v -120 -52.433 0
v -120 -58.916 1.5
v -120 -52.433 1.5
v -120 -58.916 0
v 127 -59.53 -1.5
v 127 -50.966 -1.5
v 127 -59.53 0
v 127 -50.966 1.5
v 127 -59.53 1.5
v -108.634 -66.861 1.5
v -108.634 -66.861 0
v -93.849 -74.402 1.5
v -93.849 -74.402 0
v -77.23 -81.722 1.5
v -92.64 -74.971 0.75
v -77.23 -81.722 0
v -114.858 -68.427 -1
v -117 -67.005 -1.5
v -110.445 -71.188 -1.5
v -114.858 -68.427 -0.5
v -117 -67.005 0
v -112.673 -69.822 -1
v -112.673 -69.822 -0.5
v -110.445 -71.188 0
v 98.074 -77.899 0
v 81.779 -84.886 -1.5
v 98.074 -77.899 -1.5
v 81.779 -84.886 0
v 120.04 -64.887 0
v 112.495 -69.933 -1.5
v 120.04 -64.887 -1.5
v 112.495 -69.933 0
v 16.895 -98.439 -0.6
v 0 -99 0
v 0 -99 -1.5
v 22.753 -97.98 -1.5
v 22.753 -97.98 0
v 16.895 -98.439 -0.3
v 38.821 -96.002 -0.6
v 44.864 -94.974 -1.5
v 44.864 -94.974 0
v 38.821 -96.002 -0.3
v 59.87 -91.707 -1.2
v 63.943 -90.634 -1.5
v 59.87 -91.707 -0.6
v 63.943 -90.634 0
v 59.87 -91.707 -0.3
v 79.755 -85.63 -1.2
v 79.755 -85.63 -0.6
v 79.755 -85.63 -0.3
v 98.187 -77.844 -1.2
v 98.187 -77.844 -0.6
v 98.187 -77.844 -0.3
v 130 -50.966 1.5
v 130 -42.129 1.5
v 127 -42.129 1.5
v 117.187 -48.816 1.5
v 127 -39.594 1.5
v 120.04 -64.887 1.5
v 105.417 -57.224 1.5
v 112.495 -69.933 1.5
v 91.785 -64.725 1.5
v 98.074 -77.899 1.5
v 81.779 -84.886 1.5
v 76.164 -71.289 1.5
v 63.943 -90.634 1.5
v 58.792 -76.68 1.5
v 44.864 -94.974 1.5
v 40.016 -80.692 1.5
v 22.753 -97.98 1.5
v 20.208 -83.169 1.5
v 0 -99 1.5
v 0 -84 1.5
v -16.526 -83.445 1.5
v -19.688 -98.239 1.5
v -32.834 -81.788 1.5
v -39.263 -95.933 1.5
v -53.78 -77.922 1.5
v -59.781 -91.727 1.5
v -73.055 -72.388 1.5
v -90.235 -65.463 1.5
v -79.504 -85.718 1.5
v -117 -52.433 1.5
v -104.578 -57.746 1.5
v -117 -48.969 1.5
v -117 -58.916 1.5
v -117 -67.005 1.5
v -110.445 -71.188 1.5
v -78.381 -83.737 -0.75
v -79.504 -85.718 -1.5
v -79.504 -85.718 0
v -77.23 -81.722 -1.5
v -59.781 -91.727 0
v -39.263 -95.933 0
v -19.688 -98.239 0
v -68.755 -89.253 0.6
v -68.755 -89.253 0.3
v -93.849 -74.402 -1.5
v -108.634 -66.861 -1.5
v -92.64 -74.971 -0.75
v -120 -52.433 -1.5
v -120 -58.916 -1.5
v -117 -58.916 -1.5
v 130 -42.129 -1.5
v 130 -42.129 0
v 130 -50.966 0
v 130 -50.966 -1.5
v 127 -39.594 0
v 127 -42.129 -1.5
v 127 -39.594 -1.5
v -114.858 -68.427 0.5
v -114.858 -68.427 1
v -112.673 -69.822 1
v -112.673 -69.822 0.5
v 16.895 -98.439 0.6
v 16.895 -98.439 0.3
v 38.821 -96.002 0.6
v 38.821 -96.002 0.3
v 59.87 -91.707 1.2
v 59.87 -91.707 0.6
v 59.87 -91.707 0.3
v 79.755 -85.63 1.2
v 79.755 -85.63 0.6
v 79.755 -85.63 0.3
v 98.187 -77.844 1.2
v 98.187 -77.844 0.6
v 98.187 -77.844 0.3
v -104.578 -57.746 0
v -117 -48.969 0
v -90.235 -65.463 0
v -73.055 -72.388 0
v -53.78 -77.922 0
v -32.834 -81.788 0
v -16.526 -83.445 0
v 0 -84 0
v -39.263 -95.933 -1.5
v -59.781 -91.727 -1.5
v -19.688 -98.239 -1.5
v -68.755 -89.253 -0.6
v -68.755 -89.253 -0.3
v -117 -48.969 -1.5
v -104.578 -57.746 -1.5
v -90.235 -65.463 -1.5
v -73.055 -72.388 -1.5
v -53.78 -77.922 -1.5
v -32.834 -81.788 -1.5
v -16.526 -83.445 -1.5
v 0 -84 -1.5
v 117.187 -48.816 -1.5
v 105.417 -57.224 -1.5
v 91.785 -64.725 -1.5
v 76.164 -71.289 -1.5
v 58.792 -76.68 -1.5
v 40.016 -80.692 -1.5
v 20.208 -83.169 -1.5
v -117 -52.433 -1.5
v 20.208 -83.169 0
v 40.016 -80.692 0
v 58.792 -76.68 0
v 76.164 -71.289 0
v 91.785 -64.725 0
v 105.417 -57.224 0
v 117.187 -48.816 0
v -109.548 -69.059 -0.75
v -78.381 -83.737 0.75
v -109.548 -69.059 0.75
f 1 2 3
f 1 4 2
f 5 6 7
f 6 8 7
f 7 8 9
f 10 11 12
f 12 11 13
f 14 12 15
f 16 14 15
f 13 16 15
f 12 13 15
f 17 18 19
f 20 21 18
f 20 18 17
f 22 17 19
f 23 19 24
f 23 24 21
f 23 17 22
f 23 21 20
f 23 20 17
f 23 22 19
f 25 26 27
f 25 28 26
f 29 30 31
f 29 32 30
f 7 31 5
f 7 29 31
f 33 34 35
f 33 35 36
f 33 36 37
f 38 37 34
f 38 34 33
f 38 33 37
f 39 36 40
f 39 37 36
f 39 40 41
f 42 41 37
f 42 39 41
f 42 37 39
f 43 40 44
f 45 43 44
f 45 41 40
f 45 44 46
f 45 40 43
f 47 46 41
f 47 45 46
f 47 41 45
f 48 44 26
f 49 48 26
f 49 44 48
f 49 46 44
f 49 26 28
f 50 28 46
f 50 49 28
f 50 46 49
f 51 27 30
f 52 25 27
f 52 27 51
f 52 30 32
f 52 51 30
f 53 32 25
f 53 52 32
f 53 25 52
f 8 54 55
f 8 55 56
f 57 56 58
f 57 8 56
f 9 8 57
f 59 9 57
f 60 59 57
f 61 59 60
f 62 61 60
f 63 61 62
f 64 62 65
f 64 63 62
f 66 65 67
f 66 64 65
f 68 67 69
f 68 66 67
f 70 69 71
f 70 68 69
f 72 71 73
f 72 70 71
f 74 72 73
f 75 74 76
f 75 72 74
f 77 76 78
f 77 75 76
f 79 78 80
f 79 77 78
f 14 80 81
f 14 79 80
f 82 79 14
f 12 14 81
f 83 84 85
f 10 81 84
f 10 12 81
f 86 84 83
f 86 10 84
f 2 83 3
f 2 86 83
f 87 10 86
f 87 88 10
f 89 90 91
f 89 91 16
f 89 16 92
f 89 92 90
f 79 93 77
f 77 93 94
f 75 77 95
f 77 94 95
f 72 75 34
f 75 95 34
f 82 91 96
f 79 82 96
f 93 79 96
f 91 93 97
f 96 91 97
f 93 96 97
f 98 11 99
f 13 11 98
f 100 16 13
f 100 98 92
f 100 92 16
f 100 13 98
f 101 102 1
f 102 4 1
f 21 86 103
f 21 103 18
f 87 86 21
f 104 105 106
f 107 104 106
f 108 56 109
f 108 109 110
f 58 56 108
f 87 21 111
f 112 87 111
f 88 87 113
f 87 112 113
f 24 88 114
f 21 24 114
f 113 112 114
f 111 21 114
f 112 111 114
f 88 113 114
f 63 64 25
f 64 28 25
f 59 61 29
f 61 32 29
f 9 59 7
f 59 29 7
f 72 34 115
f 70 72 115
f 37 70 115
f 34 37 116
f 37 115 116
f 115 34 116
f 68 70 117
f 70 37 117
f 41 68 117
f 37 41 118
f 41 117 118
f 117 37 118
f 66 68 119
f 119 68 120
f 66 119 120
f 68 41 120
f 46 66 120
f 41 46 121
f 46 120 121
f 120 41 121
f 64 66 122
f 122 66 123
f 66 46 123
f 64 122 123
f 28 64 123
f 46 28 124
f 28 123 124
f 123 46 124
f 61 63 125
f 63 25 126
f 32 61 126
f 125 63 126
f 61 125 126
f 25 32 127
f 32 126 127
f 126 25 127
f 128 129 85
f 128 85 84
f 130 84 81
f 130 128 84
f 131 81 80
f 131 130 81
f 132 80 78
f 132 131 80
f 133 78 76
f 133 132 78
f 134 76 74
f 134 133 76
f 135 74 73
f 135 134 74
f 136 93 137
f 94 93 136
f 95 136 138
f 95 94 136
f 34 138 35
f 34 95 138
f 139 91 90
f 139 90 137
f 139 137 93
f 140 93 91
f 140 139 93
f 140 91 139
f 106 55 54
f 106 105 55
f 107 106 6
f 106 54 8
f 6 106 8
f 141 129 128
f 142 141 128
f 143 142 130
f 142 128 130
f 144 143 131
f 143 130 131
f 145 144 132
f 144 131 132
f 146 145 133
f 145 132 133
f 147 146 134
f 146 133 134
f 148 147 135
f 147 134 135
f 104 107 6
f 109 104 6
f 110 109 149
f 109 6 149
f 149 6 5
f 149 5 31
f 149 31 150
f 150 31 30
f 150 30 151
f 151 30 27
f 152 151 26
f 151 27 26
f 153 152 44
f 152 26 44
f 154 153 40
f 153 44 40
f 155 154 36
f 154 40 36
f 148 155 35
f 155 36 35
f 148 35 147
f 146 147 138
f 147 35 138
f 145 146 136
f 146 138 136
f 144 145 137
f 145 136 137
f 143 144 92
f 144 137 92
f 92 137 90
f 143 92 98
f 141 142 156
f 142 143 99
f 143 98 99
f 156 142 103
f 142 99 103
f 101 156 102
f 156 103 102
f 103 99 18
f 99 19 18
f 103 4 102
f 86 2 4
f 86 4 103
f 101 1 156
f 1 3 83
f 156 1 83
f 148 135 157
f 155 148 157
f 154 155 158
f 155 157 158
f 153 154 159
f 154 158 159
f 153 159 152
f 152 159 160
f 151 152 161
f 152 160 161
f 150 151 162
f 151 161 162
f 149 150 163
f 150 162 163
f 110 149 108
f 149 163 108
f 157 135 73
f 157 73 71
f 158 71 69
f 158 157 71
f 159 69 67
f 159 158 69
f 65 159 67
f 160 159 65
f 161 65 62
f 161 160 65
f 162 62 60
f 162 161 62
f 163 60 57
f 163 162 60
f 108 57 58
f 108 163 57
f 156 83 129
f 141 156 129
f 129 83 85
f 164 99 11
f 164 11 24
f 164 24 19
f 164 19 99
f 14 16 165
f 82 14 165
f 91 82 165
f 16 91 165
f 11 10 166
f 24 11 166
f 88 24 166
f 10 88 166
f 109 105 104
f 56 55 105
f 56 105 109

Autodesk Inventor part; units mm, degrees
ref_plane "YZ Plane" through (0, 0, 0) normal (1, 0, 0) x (0, 1, 0)
ref_plane "XZ Plane" through (0, 0, 0) normal (0, 1, 0) x (-1, 0, 0)
ref_plane "XY Plane" through (0, 0, 0) normal (0, 0, 1) x (1, 0, 0)
ref_plane "Work Plane1" through (0, 0, 0) normal (0, 0, 1) x (-1, 0, 0)
sketch "Sketch1" plane through (0, 0, 0) normal (0, 0, 1) x (-1, 0, 0)
  spline S0 degree 3 poles (105.4883, 71.0587) (105.6559, 71.4694) (105.824, 71.88) (106.1569, 72.6904) (106.3216, 73.0904) (106.4867, 73.4901) knots -0.266162 -0.266162 -0.266162 -0.266162 -0.133087 -0.133087 -0.003341 -0.003341 -0.003341 -0.003341
  spline S1 degree 3 poles (106.4867, 73.4901) (99.3414, 77.5054) (91.623, 81.1106) (83.426, 84.2596) knots -25.895552 -25.895552 -25.895552 -25.895552 -23.89596 -23.89596 -23.89596 -23.89596
  spline S2 degree 3 poles (83.426, 84.2596) (83.383, 84.1862) (83.3401, 84.1127) (83.2498, 83.9584) (83.2025, 83.8776) (83.1552, 83.7967) knots -0.053633 -0.053633 -0.053633 -0.053633 -0.028107 -0.028107 0 0 0 0
  spline S3 degree 3 poles (83.1552, 83.7967) (82.995, 83.5034) (82.8346, 83.2101) (82.5137, 82.6238) (82.353, 82.3306) (82.1922, 82.0376) knots -0.200537 -0.200537 -0.200537 -0.200537 -0.100278 -0.100278 -0.000001 -0.000001 -0.000001 -0.000001
  spline S4 degree 3 poles (82.1922, 82.0376) (86.075, 80.3865) (89.9435, 78.6654) (97.7089, 75.0245) (101.6317, 73.0864) (105.4883, 71.0587) knots -2.573015 -2.573015 -2.573015 -2.573015 -1.307167 -1.307167 -0.00005 -0.00005 -0.00005 -0.00005
  spline S5 degree 3 poles (-58.9228, -91.9417) (-58.7749, -91.5277) (-58.6267, -91.1139) (-58.3286, -90.2835) (-58.1787, -89.8669) (-58.0284, -89.4505) knots -0.264733 -0.264733 -0.264733 -0.264733 -0.132868 -0.132868 -0.000055 -0.000055 -0.000055 -0.000055
  spline S6 degree 3 poles (-58.0284, -89.4505) (-62.2238, -88.2949) (-66.4105, -87.0769) (-74.8294, -84.4769) (-79.0836, -83.0842) (-83.2953, -81.6123) knots -2.643421 -2.643421 -2.643421 -2.643421 -1.338468 -1.338468 -0.000018 -0.000018 -0.000018 -0.000018
  spline S7 degree 3 poles (-83.2953, -81.6123) (-83.3681, -81.9392) (-83.4412, -82.2661) (-83.5877, -82.9196) (-83.6612, -83.2462) (-83.7349, -83.5728) knots -0.200918 -0.200918 -0.200918 -0.200918 -0.100445 -0.100445 0 0 0 0
  spline S8 degree 3 poles (-83.7349, -83.5728) (-83.7526, -83.6651) (-83.7703, -83.7574) (-83.8042, -83.9335) (-83.8204, -84.0175) (-83.8365, -84.1014) knots -0.056363 -0.056363 -0.056363 -0.056363 -0.02818 -0.02818 -0.002542 -0.002542 -0.002542 -0.002542
  spline S9 degree 3 poles (-83.8365, -84.1014) (-75.9007, -87.1708) (-67.5641, -89.7922) (-58.9228, -91.9417) knots -18.70759 -18.70759 -18.70759 -18.70759 -16.308401 -16.308401 -16.308401 -16.308401
  spline S10 degree 3 poles (-140.1561, 42.7052) (-140.5265, 42.9467) (-140.897, 43.1882) (-141.6163, 43.6575) (-141.9653, 43.8854) (-142.3142, 44.1132) knots -0.265285 -0.265285 -0.265285 -0.265285 -0.132646 -0.132646 -0.007633 -0.007633 -0.007633 -0.007633
  spline S11 degree 3 poles (-142.3142, 44.1132) (-146.1137, 39.3661) (-149.4383, 34.2577) (-152.1041, 28.8109) knots -4.827939 -4.827939 -4.827939 -4.827939 -3.006582 -3.006582 -3.006582 -3.006582
  spline S12 degree 3 poles (-152.1041, 28.8109) (-152.0643, 28.7818) (-152.0246, 28.7528) (-151.9093, 28.6685) (-151.8337, 28.6133) (-151.7582, 28.5581) knots -0.042842 -0.042842 -0.042842 -0.042842 -0.028073 -0.028073 -0.000004 -0.000004 -0.000004 -0.000004
  spline S13 degree 3 poles (-151.7582, 28.5581) (-151.4839, 28.3673) (-151.2096, 28.1764) (-150.6612, 27.7945) (-150.3869, 27.6033) (-150.1128, 27.4122) knots -0.200499 -0.200499 -0.200499 -0.200499 -0.100262 -0.100262 -0.000004 -0.000004 -0.000004 -0.000004
  spline S14 degree 3 poles (-150.1128, 27.4122) (-148.5536, 30.1288) (-146.8737, 32.8286) (-143.5422, 37.8978) (-141.8646, 40.3248) (-140.1561, 42.7052) knots -1.819993 -1.819993 -1.819993 -1.819993 -0.879034 -0.879034 -0.00001 -0.00001 -0.00001 -0.00001
  spline S15 degree 3 poles (-55.7728, -89.0282) (-55.9385, -89.4734) (-56.1038, -89.9189) (-56.4333, -90.8099) (-56.5976, -91.2556) (-56.7614, -91.7014) knots -0.285003 -0.285003 -0.285003 -0.285003 -0.142483 -0.142483 0 0 0 0
  spline S16 degree 3 poles (-56.7614, -91.7014) (-56.6983, -91.718) (-56.6352, -91.7345) (-56.509, -91.7676) (-56.4459, -91.7842) (-56.3828, -91.8007) knots -0.039143 -0.039143 -0.039143 -0.039143 -0.019569 -0.019569 0 0 0 0
  spline S17 degree 3 poles (-56.3828, -91.8007) (-56.222, -91.32) (-56.0607, -90.8394) (-55.7373, -89.8786) (-55.5752, -89.3983) (-55.4125, -88.9181) knots -0.30413 -0.30413 -0.30413 -0.30413 -0.152078 -0.152078 0 0 0 0
  spline S18 degree 3 poles (-55.4125, -88.9181) (-60.3959, -87.5747) (-65.3718, -86.1432) (-75.3762, -83.0506) (-80.443, -81.3711) (-85.4421, -79.5755) knots -3.141533 -3.141533 -3.141533 -3.141533 -1.593545 -1.593545 0 0 0 0
  spline S19 degree 3 poles (-85.4421, -79.5755) (-85.6008, -80.3472) (-85.7615, -81.1191) (-86.0831, -82.6482) (-86.2442, -83.4064) (-86.4067, -84.1638) knots -0.472496 -0.472496 -0.472496 -0.472496 -0.236135 -0.236135 -0.003733 -0.003733 -0.003733 -0.003733
  spline S20 degree 3 poles (-86.4067, -84.1638) (-90.9201, -82.3538) (-95.299, -80.3975) (-116.0195, -70.1094) (-129.7607, -59.9705) (-146.1593, -41.4596) (-151.3501, -33.6293) (-158.2079, -17.0493) (-159.9962, -8.6553) (-160, -0.0185) (-160, -0.0092) (-160, 0) knots -11.169519 -11.169519 -11.169519 -11.169519 -9.988301 -9.988301 -5.37837 -5.37837 -2.588261 -2.588261 0 0 0.002775 0.002775 0.002775 0.002775
  spline S21 degree 3 poles (-160, 0) (-160, 0.0092) (-160, 0.0185) (-159.9962, 8.6553) (-158.2079, 17.0493) (-154.5318, 25.937) (-154.1376, 26.8372) (-153.7259, 27.7288) knots -31.829362 -31.829362 -31.829362 -31.829362 -31.826146 -31.826146 -28.826161 -28.826161 -28.484445 -28.484445 -28.484445 -28.484445
  spline S22 degree 3 poles (-153.7259, 27.7288) (-153.1336, 27.3124) (-152.5409, 26.8949) (-151.3076, 26.0243) (-150.6649, 25.5695) (-150.024, 25.1147) knots -0.452924 -0.452924 -0.452924 -0.452924 -0.235762 -0.235762 0 0 0 0
  spline S23 degree 3 poles (-150.024, 25.1147) (-148.2187, 28.3868) (-146.2111, 31.6512) (-142.2626, 37.6605) (-140.2732, 40.5119) (-138.2471, 43.2948) knots -2.156978 -2.156978 -2.156978 -2.156978 -1.032693 -1.032693 0 0 0 0
  spline S24 degree 3 poles (-138.2471, 43.2948) (-138.666, 43.5795) (-139.085, 43.8644) (-139.9224, 44.4342) (-140.3412, 44.7193) (-140.7597, 45.0044) knots -0.303868 -0.303868 -0.303868 -0.303868 -0.151928 -0.151928 0 0 0 0
  spline S25 degree 3 poles (-140.7597, 45.0044) (-140.7862, 44.9688) (-140.8126, 44.9333) (-140.8655, 44.8622) (-140.8919, 44.8266) (-140.9183, 44.7911) knots -0.026582 -0.026582 -0.026582 -0.026582 -0.013294 -0.013294 0 0 0 0
  spline S26 degree 3 poles (-140.9183, 44.7911) (-140.5212, 44.5325) (-140.1238, 44.2739) (-139.3291, 43.7572) (-138.9316, 43.4988) (-138.5341, 43.2407) knots -0.284373 -0.284373 -0.284373 -0.284373 -0.142194 -0.142194 0 0 0 0
  spline S27 degree 3 poles (-138.5341, 43.2407) (-140.5827, 40.4214) (-142.5937, 37.5316) (-146.4382, 31.6576) (-148.3257, 28.5856) (-150.0388, 25.5027) knots -2.101071 -2.101071 -2.101071 -2.101071 -1.058051 -1.058051 0 0 0 0
  spline S28 degree 3 poles (-150.0388, 25.5027) (-150.4509, 25.7942) (-150.8636, 26.0856) (-151.6884, 26.6672) (-152.1012, 26.9578) (-152.5139, 27.2479) knots -0.302777 -0.302777 -0.302777 -0.302777 -0.151341 -0.151341 0 0 0 0
  spline S29 degree 3 poles (-152.5139, 27.2479) (-152.7152, 27.3968) (-152.9166, 27.5456) (-153.2728, 27.8086) (-153.4277, 27.9229) (-153.5827, 28.0371) knots -0.150173 -0.150173 -0.150173 -0.150173 -0.075073 -0.075073 -0.017326 -0.017326 -0.017326 -0.017326
  spline S30 degree 3 poles (-153.5827, 28.0371) (-150.1123, 35.463) (-145.4306, 42.2822) (-129.7607, 59.9705) (-116.0195, 70.1094) (-76.1689, 89.896) (-48.1593, 97.1685) (10.3236, 101.4292) (40.3067, 98.6374) (72.6866, 89.1455) (77.3003, 87.6154) (81.772, 85.9536) knots -28.445006 -28.445006 -28.445006 -28.445006 -25.59222 -25.59222 -20.248971 -20.248971 -12.682668 -12.682668 -5.317025 -5.317025 -4.052572 -4.052572 -4.052572 -4.052572
  spline S31 degree 3 poles (81.772, 85.9536) (81.3968, 85.2772) (81.0207, 84.6011) (80.261, 83.24) (79.8771, 82.5546) (79.4924, 81.87) knots -0.467618 -0.467618 -0.467618 -0.467618 -0.235584 -0.235584 0 0 0 0
  spline S32 degree 3 poles (79.4924, 81.87) (84.1061, 79.9441) (88.7048, 77.9202) (97.927, 73.5976) (102.5965, 71.2674) (107.162, 68.806) knots -3.056553 -3.056553 -3.056553 -3.056553 -1.556035 -1.556035 0 0 0 0
  spline S33 degree 3 poles (107.162, 68.806) (107.3625, 69.2729) (107.5637, 69.7398) (107.967, 70.6725) (108.1693, 71.1387) (108.372, 71.6045) knots -0.304859 -0.304859 -0.304859 -0.304859 -0.152403 -0.152403 0 0 0 0
  spline S34 degree 3 poles (108.372, 71.6045) (108.3114, 71.6376) (108.2508, 71.6707) (108.1296, 71.7369) (108.069, 71.7699) (108.0084, 71.8029) knots -0.041431 -0.041431 -0.041431 -0.041431 -0.020705 -0.020705 0 0 0 0
  spline S35 degree 3 poles (108.0084, 71.8029) (107.8317, 71.3605) (107.6555, 70.9178) (107.3043, 70.0319) (107.1293, 69.5884) (106.9549, 69.1449) knots -0.285892 -0.285892 -0.285892 -0.285892 -0.142982 -0.142982 0 0 0 0
  spline S36 degree 3 poles (106.9549, 69.1449) (102.4581, 71.5609) (97.862, 73.8503) (88.8578, 78.0679) (84.4081, 80.0293) (79.9435, 81.8987) knots -2.982662 -2.982662 -2.982662 -2.982662 -1.452066 -1.452066 0 0 0 0
  spline S37 degree 3 poles (79.9435, 81.8987) (80.1899, 82.3388) (80.4359, 82.7793) (80.9269, 83.6602) (81.172, 84.1009) (81.4166, 84.5417) knots -0.302566 -0.302566 -0.302566 -0.302566 -0.151255 -0.151255 0 0 0 0
  spline S38 degree 3 poles (81.4166, 84.5417) (81.5446, 84.757) (81.6725, 84.9724) (81.9225, 85.3939) (82.0446, 85.6002) (82.1667, 85.8065) knots -0.150242 -0.150242 -0.150242 -0.150242 -0.075112 -0.075112 -0.003204 -0.003204 -0.003204 -0.003204
  spline S39 degree 3 poles (82.1667, 85.8065) (96.3401, 80.5048) (109.0798, 73.8828) (120, 66.1438) knots -4.015333 -4.015333 -4.015333 -4.015333 0 0 0 0
  line L0 (120, 66.1438) -> (120, 64.9158)
  spline S40 degree 3 poles (120, 64.9158) (116.958, 67.0958) (113.7696, 69.1883) (110.4451, 71.1884) knots -27.230162 -27.230162 -27.230162 -27.230162 -26.2705 -26.2705 -26.2705 -26.2705
  spline S41 degree 3 poles (110.4451, 71.1884) (110.1445, 70.4793) (109.8452, 69.769) (109.2415, 68.3271) (108.9366, 67.5943) (108.6339, 66.8613) knots -0.468981 -0.468981 -0.468981 -0.468981 -0.237923 -0.237923 -0.000011 -0.000011 -0.000011 -0.000011
  spline S42 degree 3 poles (108.6339, 66.8613) (103.4133, 69.7415) (98.0406, 72.4439) (87.5696, 77.3439) (82.4064, 79.5941) (77.2296, 81.7217) knots -3.467821 -3.467821 -3.467821 -3.467821 -1.679111 -1.679111 -0.000008 -0.000008 -0.000008 -0.000008
  spline S43 degree 3 poles (77.2296, 81.7217) (77.6144, 82.3927) (77.9981, 83.0647) (78.7561, 84.3968) (79.1306, 85.0574) (79.504, 85.7183) knots -0.463944 -0.463944 -0.463944 -0.463944 -0.231888 -0.231888 -0.004157 -0.004157 -0.004157 -0.004157
  spline S44 degree 3 poles (79.504, 85.7183) (76.0004, 86.9793) (72.415, 88.1586) (41.4117, 97.4273) (11.7123, 100.3449) (-46.585, 96.4605) (-74.7083, 89.3312) (-114.7844, 69.7233) (-128.6069, 59.6354) (-139.3968, 47.5895) (-139.9204, 46.9907) (-140.4363, 46.3856) knots -23.579938 -23.579938 -23.579938 -23.579938 -22.740514 -22.740514 -16.469513 -16.469513 -9.96116 -9.96116 -5.360215 -5.360215 -5.122195 -5.122195 -5.122195 -5.122195
  spline S45 degree 3 poles (-140.4363, 46.3856) (-139.8213, 45.9676) (-139.2057, 45.5495) (-137.9379, 44.6893) (-137.2846, 44.2465) (-136.6316, 43.8045) knots -0.459695 -0.459695 -0.459695 -0.459695 -0.236626 -0.236626 -0.000067 -0.000067 -0.000067 -0.000067
  spline S46 degree 3 poles (-136.6316, 43.8045) (-139.0543, 40.5163) (-141.435, 37.1237) (-145.8862, 30.2958) (-148.0558, 26.7109) (-149.9507, 23.1379) knots -2.432531 -2.432531 -2.432531 -2.432531 -1.213323 -1.213323 -0.000041 -0.000041 -0.000041 -0.000041
  spline S47 degree 3 poles (-149.9507, 23.1379) (-150.5793, 23.5926) (-151.2102, 24.0472) (-152.4036, 24.904) (-152.9683, 25.3083) (-153.5328, 25.7113) knots -0.46512 -0.46512 -0.46512 -0.46512 -0.232385 -0.232385 -0.024389 -0.024389 -0.024389 -0.024389
  spline S48 degree 3 poles (-153.5328, 25.7113) (-153.6538, 25.4318) (-153.773, 25.1514) (-157.1991, 16.9475) (-158.9961, 8.6066) (-159, 0.0184) (-159, 0.0092) (-159, 0) knots -2.665061 -2.665061 -2.665061 -2.665061 -2.573705 -2.573705 0 0 0.002756 0.002756 0.002756 0.002756
  spline S49 degree 3 poles (-159, 0) (-159, -0.0092) (-159, -0.0184) (-158.9961, -8.6066) (-157.1991, -16.9475) (-150.3081, -33.4479) (-145.0794, -41.2454) (-128.6069, -59.6354) (-114.7844, -69.7233) (-94.9296, -79.4376) (-91.5828, -80.947) (-88.1549, -82.3704) knots -31.860137 -31.860137 -31.860137 -31.860137 -31.856914 -31.856914 -28.845903 -28.845903 -25.585929 -25.585929 -20.203225 -20.203225 -19.146895 -19.146895 -19.146895 -19.146895
  spline S50 degree 3 poles (-88.1549, -82.3704) (-88.0052, -81.6256) (-87.8572, -80.88) (-87.5617, -79.3716) (-87.4141, -78.6078) (-87.2687, -77.844) knots -0.461141 -0.461141 -0.461141 -0.461141 -0.233241 -0.233241 -0.000001 -0.000001 -0.000001 -0.000001
  spline S51 degree 3 poles (-87.2687, -77.844) (-81.5487, -79.9485) (-75.7304, -81.8959) (-64.3706, -85.4046) (-58.7727, -86.9978) (-53.1699, -88.4802) knots -3.567329 -3.567329 -3.567329 -3.567329 -1.738656 -1.738656 -0.000005 -0.000005 -0.000005 -0.000005
  spline S52 degree 3 poles (-53.1699, -88.4802) (-53.431, -89.2258) (-53.6908, -89.9722) (-54.2061, -91.4603) (-54.4617, -92.2027) (-54.7161, -92.9452) knots -0.473894 -0.473894 -0.473894 -0.473894 -0.236906 -0.236906 -0.001451 -0.001451 -0.001451 -0.001451
  spline S53 degree 3 poles (-54.7161, -92.9452) (-42.581, -95.7181) (-29.8883, -97.573) (11.7123, -100.3449) (41.4117, -97.4273) (88.331, -83.4004) (105.7686, -75.1143) (120, -64.9158) knots -15.921251 -15.921251 -15.921251 -15.921251 -12.589021 -12.589021 -5.252496 -5.252496 0 0 0 0
  line L1 (120, -64.9158) -> (120, -66.1438)
  spline S54 degree 3 poles (120, -66.1438) (105.5396, -76.3916) (87.8918, -84.6882) (40.3067, -98.6374) (10.3236, -101.4292) (-42.6253, -97.5717) (-65.6494, -92.43) (-85.9727, -84.3372) knots -27.458265 -27.458265 -27.458265 -27.458265 -22.870958 -22.870958 -16.51619 -16.51619 -11.207345 -11.207345 -11.207345 -11.207345
  spline S55 degree 3 poles (-85.9727, -84.3372) (-85.9295, -84.1013) (-85.8864, -83.8654) (-85.7984, -83.3821) (-85.7536, -83.1347) (-85.709, -82.8873) knots -0.147372 -0.147372 -0.147372 -0.147372 -0.075421 -0.075421 0 0 0 0
  spline S56 degree 3 poles (-85.709, -82.8873) (-85.6031, -82.3929) (-85.4977, -81.8982) (-85.2884, -80.9085) (-85.1844, -80.4132) (-85.081, -79.918) knots -0.303476 -0.303476 -0.303476 -0.303476 -0.151784 -0.151784 0 0 0 0
  spline S57 degree 3 poles (-85.081, -79.918) (-80.1681, -81.6744) (-75.1908, -83.3195) (-65.4257, -86.3336) (-60.6031, -87.7222) (-55.7728, -89.0282) knots -3.066818 -3.066818 -3.066818 -3.066818 -1.501137 -1.501137 0 0 0 0
  line L2 (-130, 8.1062) -> (-130, 56.9656) projected
  line L3 (-130, 56.9656) -> (-130, 45.8815)
  line L4 (120, 64.9158) -> (120, 46.4329)
  ellipse E0 centre (0, 0) end of major axis (0, 84.0004) minor radius 144
  line L5 (-217.5271, 0) -> (185.1628, 0)
  line L6 (0, -140) -> (0, 140)
  point P0 (-144, 0)
  point P1 (0, 99.0004)
  point P2 (0, 84.0004)
  point P3 (-130, 36.1292)
  dimension "d0" = 15
  dimension "d1" = 15
extrude "Extrusion1" add sketch "Sketch1" along normal mid plane 3 contours L2 S44 L6 E0 | E0 L6 S44 S43 S42 S41 S40 L4
sketch "Sketch2" plane through (0, 0, 1.5) normal (0, 0, 1) x (1, 0, 0)
  line L0 (-120, -46.4329) -> (-120, -64.9158) projected
  line L1 (130, -56.9656) -> (130, -36.1292) projected
  line L2 (130, -42.1292) -> (127, -42.1292)
  line L3 (127, -42.1292) -> (127, -31.2453)
  line L4 (127, -31.2453) -> (130, -31.2453)
  line L5 (130, -31.2453) -> (130, -42.1292)
  line L6 (130, -50.9656) -> (127, -50.9656)
  line L7 (127, -50.9656) -> (127, -61.0476)
  line L8 (127, -61.0476) -> (130, -61.0476)
  line L9 (130, -61.0476) -> (130, -50.9656)
  line L10 (-120, -52.4329) -> (-117, -52.4329)
  line L11 (-117, -52.4329) -> (-117, -43.0285)
  line L12 (-117, -43.0285) -> (-120, -43.0285)
  line L13 (-120, -43.0285) -> (-120, -52.4329)
  line L14 (-120, -58.9158) -> (-117, -58.9158)
  line L15 (-117, -58.9158) -> (-117, -71.4096)
  line L16 (-117, -71.4096) -> (-120, -71.4096)
  line L17 (-120, -71.4096) -> (-120, -58.9158)
  point P0 (0, 0)
  point P1 (128.5, -42.1292)
  point P2 (-118.5, -52.4329)
  point P3 (130, -50.9656)
  point P4 (130, -42.1292)
  dimension "d5" = 3
  dimension "d6" = 3
  dimension "d7" = 6
  dimension "d8" = 6
  dimension "d9" = 3
  dimension "d10" = 3
  dimension "d11" = 6
  dimension "d12" = 6
extrude "Extrusion2" cut sketch "Sketch2" against normal blind 10
properties part number "Spant2"
